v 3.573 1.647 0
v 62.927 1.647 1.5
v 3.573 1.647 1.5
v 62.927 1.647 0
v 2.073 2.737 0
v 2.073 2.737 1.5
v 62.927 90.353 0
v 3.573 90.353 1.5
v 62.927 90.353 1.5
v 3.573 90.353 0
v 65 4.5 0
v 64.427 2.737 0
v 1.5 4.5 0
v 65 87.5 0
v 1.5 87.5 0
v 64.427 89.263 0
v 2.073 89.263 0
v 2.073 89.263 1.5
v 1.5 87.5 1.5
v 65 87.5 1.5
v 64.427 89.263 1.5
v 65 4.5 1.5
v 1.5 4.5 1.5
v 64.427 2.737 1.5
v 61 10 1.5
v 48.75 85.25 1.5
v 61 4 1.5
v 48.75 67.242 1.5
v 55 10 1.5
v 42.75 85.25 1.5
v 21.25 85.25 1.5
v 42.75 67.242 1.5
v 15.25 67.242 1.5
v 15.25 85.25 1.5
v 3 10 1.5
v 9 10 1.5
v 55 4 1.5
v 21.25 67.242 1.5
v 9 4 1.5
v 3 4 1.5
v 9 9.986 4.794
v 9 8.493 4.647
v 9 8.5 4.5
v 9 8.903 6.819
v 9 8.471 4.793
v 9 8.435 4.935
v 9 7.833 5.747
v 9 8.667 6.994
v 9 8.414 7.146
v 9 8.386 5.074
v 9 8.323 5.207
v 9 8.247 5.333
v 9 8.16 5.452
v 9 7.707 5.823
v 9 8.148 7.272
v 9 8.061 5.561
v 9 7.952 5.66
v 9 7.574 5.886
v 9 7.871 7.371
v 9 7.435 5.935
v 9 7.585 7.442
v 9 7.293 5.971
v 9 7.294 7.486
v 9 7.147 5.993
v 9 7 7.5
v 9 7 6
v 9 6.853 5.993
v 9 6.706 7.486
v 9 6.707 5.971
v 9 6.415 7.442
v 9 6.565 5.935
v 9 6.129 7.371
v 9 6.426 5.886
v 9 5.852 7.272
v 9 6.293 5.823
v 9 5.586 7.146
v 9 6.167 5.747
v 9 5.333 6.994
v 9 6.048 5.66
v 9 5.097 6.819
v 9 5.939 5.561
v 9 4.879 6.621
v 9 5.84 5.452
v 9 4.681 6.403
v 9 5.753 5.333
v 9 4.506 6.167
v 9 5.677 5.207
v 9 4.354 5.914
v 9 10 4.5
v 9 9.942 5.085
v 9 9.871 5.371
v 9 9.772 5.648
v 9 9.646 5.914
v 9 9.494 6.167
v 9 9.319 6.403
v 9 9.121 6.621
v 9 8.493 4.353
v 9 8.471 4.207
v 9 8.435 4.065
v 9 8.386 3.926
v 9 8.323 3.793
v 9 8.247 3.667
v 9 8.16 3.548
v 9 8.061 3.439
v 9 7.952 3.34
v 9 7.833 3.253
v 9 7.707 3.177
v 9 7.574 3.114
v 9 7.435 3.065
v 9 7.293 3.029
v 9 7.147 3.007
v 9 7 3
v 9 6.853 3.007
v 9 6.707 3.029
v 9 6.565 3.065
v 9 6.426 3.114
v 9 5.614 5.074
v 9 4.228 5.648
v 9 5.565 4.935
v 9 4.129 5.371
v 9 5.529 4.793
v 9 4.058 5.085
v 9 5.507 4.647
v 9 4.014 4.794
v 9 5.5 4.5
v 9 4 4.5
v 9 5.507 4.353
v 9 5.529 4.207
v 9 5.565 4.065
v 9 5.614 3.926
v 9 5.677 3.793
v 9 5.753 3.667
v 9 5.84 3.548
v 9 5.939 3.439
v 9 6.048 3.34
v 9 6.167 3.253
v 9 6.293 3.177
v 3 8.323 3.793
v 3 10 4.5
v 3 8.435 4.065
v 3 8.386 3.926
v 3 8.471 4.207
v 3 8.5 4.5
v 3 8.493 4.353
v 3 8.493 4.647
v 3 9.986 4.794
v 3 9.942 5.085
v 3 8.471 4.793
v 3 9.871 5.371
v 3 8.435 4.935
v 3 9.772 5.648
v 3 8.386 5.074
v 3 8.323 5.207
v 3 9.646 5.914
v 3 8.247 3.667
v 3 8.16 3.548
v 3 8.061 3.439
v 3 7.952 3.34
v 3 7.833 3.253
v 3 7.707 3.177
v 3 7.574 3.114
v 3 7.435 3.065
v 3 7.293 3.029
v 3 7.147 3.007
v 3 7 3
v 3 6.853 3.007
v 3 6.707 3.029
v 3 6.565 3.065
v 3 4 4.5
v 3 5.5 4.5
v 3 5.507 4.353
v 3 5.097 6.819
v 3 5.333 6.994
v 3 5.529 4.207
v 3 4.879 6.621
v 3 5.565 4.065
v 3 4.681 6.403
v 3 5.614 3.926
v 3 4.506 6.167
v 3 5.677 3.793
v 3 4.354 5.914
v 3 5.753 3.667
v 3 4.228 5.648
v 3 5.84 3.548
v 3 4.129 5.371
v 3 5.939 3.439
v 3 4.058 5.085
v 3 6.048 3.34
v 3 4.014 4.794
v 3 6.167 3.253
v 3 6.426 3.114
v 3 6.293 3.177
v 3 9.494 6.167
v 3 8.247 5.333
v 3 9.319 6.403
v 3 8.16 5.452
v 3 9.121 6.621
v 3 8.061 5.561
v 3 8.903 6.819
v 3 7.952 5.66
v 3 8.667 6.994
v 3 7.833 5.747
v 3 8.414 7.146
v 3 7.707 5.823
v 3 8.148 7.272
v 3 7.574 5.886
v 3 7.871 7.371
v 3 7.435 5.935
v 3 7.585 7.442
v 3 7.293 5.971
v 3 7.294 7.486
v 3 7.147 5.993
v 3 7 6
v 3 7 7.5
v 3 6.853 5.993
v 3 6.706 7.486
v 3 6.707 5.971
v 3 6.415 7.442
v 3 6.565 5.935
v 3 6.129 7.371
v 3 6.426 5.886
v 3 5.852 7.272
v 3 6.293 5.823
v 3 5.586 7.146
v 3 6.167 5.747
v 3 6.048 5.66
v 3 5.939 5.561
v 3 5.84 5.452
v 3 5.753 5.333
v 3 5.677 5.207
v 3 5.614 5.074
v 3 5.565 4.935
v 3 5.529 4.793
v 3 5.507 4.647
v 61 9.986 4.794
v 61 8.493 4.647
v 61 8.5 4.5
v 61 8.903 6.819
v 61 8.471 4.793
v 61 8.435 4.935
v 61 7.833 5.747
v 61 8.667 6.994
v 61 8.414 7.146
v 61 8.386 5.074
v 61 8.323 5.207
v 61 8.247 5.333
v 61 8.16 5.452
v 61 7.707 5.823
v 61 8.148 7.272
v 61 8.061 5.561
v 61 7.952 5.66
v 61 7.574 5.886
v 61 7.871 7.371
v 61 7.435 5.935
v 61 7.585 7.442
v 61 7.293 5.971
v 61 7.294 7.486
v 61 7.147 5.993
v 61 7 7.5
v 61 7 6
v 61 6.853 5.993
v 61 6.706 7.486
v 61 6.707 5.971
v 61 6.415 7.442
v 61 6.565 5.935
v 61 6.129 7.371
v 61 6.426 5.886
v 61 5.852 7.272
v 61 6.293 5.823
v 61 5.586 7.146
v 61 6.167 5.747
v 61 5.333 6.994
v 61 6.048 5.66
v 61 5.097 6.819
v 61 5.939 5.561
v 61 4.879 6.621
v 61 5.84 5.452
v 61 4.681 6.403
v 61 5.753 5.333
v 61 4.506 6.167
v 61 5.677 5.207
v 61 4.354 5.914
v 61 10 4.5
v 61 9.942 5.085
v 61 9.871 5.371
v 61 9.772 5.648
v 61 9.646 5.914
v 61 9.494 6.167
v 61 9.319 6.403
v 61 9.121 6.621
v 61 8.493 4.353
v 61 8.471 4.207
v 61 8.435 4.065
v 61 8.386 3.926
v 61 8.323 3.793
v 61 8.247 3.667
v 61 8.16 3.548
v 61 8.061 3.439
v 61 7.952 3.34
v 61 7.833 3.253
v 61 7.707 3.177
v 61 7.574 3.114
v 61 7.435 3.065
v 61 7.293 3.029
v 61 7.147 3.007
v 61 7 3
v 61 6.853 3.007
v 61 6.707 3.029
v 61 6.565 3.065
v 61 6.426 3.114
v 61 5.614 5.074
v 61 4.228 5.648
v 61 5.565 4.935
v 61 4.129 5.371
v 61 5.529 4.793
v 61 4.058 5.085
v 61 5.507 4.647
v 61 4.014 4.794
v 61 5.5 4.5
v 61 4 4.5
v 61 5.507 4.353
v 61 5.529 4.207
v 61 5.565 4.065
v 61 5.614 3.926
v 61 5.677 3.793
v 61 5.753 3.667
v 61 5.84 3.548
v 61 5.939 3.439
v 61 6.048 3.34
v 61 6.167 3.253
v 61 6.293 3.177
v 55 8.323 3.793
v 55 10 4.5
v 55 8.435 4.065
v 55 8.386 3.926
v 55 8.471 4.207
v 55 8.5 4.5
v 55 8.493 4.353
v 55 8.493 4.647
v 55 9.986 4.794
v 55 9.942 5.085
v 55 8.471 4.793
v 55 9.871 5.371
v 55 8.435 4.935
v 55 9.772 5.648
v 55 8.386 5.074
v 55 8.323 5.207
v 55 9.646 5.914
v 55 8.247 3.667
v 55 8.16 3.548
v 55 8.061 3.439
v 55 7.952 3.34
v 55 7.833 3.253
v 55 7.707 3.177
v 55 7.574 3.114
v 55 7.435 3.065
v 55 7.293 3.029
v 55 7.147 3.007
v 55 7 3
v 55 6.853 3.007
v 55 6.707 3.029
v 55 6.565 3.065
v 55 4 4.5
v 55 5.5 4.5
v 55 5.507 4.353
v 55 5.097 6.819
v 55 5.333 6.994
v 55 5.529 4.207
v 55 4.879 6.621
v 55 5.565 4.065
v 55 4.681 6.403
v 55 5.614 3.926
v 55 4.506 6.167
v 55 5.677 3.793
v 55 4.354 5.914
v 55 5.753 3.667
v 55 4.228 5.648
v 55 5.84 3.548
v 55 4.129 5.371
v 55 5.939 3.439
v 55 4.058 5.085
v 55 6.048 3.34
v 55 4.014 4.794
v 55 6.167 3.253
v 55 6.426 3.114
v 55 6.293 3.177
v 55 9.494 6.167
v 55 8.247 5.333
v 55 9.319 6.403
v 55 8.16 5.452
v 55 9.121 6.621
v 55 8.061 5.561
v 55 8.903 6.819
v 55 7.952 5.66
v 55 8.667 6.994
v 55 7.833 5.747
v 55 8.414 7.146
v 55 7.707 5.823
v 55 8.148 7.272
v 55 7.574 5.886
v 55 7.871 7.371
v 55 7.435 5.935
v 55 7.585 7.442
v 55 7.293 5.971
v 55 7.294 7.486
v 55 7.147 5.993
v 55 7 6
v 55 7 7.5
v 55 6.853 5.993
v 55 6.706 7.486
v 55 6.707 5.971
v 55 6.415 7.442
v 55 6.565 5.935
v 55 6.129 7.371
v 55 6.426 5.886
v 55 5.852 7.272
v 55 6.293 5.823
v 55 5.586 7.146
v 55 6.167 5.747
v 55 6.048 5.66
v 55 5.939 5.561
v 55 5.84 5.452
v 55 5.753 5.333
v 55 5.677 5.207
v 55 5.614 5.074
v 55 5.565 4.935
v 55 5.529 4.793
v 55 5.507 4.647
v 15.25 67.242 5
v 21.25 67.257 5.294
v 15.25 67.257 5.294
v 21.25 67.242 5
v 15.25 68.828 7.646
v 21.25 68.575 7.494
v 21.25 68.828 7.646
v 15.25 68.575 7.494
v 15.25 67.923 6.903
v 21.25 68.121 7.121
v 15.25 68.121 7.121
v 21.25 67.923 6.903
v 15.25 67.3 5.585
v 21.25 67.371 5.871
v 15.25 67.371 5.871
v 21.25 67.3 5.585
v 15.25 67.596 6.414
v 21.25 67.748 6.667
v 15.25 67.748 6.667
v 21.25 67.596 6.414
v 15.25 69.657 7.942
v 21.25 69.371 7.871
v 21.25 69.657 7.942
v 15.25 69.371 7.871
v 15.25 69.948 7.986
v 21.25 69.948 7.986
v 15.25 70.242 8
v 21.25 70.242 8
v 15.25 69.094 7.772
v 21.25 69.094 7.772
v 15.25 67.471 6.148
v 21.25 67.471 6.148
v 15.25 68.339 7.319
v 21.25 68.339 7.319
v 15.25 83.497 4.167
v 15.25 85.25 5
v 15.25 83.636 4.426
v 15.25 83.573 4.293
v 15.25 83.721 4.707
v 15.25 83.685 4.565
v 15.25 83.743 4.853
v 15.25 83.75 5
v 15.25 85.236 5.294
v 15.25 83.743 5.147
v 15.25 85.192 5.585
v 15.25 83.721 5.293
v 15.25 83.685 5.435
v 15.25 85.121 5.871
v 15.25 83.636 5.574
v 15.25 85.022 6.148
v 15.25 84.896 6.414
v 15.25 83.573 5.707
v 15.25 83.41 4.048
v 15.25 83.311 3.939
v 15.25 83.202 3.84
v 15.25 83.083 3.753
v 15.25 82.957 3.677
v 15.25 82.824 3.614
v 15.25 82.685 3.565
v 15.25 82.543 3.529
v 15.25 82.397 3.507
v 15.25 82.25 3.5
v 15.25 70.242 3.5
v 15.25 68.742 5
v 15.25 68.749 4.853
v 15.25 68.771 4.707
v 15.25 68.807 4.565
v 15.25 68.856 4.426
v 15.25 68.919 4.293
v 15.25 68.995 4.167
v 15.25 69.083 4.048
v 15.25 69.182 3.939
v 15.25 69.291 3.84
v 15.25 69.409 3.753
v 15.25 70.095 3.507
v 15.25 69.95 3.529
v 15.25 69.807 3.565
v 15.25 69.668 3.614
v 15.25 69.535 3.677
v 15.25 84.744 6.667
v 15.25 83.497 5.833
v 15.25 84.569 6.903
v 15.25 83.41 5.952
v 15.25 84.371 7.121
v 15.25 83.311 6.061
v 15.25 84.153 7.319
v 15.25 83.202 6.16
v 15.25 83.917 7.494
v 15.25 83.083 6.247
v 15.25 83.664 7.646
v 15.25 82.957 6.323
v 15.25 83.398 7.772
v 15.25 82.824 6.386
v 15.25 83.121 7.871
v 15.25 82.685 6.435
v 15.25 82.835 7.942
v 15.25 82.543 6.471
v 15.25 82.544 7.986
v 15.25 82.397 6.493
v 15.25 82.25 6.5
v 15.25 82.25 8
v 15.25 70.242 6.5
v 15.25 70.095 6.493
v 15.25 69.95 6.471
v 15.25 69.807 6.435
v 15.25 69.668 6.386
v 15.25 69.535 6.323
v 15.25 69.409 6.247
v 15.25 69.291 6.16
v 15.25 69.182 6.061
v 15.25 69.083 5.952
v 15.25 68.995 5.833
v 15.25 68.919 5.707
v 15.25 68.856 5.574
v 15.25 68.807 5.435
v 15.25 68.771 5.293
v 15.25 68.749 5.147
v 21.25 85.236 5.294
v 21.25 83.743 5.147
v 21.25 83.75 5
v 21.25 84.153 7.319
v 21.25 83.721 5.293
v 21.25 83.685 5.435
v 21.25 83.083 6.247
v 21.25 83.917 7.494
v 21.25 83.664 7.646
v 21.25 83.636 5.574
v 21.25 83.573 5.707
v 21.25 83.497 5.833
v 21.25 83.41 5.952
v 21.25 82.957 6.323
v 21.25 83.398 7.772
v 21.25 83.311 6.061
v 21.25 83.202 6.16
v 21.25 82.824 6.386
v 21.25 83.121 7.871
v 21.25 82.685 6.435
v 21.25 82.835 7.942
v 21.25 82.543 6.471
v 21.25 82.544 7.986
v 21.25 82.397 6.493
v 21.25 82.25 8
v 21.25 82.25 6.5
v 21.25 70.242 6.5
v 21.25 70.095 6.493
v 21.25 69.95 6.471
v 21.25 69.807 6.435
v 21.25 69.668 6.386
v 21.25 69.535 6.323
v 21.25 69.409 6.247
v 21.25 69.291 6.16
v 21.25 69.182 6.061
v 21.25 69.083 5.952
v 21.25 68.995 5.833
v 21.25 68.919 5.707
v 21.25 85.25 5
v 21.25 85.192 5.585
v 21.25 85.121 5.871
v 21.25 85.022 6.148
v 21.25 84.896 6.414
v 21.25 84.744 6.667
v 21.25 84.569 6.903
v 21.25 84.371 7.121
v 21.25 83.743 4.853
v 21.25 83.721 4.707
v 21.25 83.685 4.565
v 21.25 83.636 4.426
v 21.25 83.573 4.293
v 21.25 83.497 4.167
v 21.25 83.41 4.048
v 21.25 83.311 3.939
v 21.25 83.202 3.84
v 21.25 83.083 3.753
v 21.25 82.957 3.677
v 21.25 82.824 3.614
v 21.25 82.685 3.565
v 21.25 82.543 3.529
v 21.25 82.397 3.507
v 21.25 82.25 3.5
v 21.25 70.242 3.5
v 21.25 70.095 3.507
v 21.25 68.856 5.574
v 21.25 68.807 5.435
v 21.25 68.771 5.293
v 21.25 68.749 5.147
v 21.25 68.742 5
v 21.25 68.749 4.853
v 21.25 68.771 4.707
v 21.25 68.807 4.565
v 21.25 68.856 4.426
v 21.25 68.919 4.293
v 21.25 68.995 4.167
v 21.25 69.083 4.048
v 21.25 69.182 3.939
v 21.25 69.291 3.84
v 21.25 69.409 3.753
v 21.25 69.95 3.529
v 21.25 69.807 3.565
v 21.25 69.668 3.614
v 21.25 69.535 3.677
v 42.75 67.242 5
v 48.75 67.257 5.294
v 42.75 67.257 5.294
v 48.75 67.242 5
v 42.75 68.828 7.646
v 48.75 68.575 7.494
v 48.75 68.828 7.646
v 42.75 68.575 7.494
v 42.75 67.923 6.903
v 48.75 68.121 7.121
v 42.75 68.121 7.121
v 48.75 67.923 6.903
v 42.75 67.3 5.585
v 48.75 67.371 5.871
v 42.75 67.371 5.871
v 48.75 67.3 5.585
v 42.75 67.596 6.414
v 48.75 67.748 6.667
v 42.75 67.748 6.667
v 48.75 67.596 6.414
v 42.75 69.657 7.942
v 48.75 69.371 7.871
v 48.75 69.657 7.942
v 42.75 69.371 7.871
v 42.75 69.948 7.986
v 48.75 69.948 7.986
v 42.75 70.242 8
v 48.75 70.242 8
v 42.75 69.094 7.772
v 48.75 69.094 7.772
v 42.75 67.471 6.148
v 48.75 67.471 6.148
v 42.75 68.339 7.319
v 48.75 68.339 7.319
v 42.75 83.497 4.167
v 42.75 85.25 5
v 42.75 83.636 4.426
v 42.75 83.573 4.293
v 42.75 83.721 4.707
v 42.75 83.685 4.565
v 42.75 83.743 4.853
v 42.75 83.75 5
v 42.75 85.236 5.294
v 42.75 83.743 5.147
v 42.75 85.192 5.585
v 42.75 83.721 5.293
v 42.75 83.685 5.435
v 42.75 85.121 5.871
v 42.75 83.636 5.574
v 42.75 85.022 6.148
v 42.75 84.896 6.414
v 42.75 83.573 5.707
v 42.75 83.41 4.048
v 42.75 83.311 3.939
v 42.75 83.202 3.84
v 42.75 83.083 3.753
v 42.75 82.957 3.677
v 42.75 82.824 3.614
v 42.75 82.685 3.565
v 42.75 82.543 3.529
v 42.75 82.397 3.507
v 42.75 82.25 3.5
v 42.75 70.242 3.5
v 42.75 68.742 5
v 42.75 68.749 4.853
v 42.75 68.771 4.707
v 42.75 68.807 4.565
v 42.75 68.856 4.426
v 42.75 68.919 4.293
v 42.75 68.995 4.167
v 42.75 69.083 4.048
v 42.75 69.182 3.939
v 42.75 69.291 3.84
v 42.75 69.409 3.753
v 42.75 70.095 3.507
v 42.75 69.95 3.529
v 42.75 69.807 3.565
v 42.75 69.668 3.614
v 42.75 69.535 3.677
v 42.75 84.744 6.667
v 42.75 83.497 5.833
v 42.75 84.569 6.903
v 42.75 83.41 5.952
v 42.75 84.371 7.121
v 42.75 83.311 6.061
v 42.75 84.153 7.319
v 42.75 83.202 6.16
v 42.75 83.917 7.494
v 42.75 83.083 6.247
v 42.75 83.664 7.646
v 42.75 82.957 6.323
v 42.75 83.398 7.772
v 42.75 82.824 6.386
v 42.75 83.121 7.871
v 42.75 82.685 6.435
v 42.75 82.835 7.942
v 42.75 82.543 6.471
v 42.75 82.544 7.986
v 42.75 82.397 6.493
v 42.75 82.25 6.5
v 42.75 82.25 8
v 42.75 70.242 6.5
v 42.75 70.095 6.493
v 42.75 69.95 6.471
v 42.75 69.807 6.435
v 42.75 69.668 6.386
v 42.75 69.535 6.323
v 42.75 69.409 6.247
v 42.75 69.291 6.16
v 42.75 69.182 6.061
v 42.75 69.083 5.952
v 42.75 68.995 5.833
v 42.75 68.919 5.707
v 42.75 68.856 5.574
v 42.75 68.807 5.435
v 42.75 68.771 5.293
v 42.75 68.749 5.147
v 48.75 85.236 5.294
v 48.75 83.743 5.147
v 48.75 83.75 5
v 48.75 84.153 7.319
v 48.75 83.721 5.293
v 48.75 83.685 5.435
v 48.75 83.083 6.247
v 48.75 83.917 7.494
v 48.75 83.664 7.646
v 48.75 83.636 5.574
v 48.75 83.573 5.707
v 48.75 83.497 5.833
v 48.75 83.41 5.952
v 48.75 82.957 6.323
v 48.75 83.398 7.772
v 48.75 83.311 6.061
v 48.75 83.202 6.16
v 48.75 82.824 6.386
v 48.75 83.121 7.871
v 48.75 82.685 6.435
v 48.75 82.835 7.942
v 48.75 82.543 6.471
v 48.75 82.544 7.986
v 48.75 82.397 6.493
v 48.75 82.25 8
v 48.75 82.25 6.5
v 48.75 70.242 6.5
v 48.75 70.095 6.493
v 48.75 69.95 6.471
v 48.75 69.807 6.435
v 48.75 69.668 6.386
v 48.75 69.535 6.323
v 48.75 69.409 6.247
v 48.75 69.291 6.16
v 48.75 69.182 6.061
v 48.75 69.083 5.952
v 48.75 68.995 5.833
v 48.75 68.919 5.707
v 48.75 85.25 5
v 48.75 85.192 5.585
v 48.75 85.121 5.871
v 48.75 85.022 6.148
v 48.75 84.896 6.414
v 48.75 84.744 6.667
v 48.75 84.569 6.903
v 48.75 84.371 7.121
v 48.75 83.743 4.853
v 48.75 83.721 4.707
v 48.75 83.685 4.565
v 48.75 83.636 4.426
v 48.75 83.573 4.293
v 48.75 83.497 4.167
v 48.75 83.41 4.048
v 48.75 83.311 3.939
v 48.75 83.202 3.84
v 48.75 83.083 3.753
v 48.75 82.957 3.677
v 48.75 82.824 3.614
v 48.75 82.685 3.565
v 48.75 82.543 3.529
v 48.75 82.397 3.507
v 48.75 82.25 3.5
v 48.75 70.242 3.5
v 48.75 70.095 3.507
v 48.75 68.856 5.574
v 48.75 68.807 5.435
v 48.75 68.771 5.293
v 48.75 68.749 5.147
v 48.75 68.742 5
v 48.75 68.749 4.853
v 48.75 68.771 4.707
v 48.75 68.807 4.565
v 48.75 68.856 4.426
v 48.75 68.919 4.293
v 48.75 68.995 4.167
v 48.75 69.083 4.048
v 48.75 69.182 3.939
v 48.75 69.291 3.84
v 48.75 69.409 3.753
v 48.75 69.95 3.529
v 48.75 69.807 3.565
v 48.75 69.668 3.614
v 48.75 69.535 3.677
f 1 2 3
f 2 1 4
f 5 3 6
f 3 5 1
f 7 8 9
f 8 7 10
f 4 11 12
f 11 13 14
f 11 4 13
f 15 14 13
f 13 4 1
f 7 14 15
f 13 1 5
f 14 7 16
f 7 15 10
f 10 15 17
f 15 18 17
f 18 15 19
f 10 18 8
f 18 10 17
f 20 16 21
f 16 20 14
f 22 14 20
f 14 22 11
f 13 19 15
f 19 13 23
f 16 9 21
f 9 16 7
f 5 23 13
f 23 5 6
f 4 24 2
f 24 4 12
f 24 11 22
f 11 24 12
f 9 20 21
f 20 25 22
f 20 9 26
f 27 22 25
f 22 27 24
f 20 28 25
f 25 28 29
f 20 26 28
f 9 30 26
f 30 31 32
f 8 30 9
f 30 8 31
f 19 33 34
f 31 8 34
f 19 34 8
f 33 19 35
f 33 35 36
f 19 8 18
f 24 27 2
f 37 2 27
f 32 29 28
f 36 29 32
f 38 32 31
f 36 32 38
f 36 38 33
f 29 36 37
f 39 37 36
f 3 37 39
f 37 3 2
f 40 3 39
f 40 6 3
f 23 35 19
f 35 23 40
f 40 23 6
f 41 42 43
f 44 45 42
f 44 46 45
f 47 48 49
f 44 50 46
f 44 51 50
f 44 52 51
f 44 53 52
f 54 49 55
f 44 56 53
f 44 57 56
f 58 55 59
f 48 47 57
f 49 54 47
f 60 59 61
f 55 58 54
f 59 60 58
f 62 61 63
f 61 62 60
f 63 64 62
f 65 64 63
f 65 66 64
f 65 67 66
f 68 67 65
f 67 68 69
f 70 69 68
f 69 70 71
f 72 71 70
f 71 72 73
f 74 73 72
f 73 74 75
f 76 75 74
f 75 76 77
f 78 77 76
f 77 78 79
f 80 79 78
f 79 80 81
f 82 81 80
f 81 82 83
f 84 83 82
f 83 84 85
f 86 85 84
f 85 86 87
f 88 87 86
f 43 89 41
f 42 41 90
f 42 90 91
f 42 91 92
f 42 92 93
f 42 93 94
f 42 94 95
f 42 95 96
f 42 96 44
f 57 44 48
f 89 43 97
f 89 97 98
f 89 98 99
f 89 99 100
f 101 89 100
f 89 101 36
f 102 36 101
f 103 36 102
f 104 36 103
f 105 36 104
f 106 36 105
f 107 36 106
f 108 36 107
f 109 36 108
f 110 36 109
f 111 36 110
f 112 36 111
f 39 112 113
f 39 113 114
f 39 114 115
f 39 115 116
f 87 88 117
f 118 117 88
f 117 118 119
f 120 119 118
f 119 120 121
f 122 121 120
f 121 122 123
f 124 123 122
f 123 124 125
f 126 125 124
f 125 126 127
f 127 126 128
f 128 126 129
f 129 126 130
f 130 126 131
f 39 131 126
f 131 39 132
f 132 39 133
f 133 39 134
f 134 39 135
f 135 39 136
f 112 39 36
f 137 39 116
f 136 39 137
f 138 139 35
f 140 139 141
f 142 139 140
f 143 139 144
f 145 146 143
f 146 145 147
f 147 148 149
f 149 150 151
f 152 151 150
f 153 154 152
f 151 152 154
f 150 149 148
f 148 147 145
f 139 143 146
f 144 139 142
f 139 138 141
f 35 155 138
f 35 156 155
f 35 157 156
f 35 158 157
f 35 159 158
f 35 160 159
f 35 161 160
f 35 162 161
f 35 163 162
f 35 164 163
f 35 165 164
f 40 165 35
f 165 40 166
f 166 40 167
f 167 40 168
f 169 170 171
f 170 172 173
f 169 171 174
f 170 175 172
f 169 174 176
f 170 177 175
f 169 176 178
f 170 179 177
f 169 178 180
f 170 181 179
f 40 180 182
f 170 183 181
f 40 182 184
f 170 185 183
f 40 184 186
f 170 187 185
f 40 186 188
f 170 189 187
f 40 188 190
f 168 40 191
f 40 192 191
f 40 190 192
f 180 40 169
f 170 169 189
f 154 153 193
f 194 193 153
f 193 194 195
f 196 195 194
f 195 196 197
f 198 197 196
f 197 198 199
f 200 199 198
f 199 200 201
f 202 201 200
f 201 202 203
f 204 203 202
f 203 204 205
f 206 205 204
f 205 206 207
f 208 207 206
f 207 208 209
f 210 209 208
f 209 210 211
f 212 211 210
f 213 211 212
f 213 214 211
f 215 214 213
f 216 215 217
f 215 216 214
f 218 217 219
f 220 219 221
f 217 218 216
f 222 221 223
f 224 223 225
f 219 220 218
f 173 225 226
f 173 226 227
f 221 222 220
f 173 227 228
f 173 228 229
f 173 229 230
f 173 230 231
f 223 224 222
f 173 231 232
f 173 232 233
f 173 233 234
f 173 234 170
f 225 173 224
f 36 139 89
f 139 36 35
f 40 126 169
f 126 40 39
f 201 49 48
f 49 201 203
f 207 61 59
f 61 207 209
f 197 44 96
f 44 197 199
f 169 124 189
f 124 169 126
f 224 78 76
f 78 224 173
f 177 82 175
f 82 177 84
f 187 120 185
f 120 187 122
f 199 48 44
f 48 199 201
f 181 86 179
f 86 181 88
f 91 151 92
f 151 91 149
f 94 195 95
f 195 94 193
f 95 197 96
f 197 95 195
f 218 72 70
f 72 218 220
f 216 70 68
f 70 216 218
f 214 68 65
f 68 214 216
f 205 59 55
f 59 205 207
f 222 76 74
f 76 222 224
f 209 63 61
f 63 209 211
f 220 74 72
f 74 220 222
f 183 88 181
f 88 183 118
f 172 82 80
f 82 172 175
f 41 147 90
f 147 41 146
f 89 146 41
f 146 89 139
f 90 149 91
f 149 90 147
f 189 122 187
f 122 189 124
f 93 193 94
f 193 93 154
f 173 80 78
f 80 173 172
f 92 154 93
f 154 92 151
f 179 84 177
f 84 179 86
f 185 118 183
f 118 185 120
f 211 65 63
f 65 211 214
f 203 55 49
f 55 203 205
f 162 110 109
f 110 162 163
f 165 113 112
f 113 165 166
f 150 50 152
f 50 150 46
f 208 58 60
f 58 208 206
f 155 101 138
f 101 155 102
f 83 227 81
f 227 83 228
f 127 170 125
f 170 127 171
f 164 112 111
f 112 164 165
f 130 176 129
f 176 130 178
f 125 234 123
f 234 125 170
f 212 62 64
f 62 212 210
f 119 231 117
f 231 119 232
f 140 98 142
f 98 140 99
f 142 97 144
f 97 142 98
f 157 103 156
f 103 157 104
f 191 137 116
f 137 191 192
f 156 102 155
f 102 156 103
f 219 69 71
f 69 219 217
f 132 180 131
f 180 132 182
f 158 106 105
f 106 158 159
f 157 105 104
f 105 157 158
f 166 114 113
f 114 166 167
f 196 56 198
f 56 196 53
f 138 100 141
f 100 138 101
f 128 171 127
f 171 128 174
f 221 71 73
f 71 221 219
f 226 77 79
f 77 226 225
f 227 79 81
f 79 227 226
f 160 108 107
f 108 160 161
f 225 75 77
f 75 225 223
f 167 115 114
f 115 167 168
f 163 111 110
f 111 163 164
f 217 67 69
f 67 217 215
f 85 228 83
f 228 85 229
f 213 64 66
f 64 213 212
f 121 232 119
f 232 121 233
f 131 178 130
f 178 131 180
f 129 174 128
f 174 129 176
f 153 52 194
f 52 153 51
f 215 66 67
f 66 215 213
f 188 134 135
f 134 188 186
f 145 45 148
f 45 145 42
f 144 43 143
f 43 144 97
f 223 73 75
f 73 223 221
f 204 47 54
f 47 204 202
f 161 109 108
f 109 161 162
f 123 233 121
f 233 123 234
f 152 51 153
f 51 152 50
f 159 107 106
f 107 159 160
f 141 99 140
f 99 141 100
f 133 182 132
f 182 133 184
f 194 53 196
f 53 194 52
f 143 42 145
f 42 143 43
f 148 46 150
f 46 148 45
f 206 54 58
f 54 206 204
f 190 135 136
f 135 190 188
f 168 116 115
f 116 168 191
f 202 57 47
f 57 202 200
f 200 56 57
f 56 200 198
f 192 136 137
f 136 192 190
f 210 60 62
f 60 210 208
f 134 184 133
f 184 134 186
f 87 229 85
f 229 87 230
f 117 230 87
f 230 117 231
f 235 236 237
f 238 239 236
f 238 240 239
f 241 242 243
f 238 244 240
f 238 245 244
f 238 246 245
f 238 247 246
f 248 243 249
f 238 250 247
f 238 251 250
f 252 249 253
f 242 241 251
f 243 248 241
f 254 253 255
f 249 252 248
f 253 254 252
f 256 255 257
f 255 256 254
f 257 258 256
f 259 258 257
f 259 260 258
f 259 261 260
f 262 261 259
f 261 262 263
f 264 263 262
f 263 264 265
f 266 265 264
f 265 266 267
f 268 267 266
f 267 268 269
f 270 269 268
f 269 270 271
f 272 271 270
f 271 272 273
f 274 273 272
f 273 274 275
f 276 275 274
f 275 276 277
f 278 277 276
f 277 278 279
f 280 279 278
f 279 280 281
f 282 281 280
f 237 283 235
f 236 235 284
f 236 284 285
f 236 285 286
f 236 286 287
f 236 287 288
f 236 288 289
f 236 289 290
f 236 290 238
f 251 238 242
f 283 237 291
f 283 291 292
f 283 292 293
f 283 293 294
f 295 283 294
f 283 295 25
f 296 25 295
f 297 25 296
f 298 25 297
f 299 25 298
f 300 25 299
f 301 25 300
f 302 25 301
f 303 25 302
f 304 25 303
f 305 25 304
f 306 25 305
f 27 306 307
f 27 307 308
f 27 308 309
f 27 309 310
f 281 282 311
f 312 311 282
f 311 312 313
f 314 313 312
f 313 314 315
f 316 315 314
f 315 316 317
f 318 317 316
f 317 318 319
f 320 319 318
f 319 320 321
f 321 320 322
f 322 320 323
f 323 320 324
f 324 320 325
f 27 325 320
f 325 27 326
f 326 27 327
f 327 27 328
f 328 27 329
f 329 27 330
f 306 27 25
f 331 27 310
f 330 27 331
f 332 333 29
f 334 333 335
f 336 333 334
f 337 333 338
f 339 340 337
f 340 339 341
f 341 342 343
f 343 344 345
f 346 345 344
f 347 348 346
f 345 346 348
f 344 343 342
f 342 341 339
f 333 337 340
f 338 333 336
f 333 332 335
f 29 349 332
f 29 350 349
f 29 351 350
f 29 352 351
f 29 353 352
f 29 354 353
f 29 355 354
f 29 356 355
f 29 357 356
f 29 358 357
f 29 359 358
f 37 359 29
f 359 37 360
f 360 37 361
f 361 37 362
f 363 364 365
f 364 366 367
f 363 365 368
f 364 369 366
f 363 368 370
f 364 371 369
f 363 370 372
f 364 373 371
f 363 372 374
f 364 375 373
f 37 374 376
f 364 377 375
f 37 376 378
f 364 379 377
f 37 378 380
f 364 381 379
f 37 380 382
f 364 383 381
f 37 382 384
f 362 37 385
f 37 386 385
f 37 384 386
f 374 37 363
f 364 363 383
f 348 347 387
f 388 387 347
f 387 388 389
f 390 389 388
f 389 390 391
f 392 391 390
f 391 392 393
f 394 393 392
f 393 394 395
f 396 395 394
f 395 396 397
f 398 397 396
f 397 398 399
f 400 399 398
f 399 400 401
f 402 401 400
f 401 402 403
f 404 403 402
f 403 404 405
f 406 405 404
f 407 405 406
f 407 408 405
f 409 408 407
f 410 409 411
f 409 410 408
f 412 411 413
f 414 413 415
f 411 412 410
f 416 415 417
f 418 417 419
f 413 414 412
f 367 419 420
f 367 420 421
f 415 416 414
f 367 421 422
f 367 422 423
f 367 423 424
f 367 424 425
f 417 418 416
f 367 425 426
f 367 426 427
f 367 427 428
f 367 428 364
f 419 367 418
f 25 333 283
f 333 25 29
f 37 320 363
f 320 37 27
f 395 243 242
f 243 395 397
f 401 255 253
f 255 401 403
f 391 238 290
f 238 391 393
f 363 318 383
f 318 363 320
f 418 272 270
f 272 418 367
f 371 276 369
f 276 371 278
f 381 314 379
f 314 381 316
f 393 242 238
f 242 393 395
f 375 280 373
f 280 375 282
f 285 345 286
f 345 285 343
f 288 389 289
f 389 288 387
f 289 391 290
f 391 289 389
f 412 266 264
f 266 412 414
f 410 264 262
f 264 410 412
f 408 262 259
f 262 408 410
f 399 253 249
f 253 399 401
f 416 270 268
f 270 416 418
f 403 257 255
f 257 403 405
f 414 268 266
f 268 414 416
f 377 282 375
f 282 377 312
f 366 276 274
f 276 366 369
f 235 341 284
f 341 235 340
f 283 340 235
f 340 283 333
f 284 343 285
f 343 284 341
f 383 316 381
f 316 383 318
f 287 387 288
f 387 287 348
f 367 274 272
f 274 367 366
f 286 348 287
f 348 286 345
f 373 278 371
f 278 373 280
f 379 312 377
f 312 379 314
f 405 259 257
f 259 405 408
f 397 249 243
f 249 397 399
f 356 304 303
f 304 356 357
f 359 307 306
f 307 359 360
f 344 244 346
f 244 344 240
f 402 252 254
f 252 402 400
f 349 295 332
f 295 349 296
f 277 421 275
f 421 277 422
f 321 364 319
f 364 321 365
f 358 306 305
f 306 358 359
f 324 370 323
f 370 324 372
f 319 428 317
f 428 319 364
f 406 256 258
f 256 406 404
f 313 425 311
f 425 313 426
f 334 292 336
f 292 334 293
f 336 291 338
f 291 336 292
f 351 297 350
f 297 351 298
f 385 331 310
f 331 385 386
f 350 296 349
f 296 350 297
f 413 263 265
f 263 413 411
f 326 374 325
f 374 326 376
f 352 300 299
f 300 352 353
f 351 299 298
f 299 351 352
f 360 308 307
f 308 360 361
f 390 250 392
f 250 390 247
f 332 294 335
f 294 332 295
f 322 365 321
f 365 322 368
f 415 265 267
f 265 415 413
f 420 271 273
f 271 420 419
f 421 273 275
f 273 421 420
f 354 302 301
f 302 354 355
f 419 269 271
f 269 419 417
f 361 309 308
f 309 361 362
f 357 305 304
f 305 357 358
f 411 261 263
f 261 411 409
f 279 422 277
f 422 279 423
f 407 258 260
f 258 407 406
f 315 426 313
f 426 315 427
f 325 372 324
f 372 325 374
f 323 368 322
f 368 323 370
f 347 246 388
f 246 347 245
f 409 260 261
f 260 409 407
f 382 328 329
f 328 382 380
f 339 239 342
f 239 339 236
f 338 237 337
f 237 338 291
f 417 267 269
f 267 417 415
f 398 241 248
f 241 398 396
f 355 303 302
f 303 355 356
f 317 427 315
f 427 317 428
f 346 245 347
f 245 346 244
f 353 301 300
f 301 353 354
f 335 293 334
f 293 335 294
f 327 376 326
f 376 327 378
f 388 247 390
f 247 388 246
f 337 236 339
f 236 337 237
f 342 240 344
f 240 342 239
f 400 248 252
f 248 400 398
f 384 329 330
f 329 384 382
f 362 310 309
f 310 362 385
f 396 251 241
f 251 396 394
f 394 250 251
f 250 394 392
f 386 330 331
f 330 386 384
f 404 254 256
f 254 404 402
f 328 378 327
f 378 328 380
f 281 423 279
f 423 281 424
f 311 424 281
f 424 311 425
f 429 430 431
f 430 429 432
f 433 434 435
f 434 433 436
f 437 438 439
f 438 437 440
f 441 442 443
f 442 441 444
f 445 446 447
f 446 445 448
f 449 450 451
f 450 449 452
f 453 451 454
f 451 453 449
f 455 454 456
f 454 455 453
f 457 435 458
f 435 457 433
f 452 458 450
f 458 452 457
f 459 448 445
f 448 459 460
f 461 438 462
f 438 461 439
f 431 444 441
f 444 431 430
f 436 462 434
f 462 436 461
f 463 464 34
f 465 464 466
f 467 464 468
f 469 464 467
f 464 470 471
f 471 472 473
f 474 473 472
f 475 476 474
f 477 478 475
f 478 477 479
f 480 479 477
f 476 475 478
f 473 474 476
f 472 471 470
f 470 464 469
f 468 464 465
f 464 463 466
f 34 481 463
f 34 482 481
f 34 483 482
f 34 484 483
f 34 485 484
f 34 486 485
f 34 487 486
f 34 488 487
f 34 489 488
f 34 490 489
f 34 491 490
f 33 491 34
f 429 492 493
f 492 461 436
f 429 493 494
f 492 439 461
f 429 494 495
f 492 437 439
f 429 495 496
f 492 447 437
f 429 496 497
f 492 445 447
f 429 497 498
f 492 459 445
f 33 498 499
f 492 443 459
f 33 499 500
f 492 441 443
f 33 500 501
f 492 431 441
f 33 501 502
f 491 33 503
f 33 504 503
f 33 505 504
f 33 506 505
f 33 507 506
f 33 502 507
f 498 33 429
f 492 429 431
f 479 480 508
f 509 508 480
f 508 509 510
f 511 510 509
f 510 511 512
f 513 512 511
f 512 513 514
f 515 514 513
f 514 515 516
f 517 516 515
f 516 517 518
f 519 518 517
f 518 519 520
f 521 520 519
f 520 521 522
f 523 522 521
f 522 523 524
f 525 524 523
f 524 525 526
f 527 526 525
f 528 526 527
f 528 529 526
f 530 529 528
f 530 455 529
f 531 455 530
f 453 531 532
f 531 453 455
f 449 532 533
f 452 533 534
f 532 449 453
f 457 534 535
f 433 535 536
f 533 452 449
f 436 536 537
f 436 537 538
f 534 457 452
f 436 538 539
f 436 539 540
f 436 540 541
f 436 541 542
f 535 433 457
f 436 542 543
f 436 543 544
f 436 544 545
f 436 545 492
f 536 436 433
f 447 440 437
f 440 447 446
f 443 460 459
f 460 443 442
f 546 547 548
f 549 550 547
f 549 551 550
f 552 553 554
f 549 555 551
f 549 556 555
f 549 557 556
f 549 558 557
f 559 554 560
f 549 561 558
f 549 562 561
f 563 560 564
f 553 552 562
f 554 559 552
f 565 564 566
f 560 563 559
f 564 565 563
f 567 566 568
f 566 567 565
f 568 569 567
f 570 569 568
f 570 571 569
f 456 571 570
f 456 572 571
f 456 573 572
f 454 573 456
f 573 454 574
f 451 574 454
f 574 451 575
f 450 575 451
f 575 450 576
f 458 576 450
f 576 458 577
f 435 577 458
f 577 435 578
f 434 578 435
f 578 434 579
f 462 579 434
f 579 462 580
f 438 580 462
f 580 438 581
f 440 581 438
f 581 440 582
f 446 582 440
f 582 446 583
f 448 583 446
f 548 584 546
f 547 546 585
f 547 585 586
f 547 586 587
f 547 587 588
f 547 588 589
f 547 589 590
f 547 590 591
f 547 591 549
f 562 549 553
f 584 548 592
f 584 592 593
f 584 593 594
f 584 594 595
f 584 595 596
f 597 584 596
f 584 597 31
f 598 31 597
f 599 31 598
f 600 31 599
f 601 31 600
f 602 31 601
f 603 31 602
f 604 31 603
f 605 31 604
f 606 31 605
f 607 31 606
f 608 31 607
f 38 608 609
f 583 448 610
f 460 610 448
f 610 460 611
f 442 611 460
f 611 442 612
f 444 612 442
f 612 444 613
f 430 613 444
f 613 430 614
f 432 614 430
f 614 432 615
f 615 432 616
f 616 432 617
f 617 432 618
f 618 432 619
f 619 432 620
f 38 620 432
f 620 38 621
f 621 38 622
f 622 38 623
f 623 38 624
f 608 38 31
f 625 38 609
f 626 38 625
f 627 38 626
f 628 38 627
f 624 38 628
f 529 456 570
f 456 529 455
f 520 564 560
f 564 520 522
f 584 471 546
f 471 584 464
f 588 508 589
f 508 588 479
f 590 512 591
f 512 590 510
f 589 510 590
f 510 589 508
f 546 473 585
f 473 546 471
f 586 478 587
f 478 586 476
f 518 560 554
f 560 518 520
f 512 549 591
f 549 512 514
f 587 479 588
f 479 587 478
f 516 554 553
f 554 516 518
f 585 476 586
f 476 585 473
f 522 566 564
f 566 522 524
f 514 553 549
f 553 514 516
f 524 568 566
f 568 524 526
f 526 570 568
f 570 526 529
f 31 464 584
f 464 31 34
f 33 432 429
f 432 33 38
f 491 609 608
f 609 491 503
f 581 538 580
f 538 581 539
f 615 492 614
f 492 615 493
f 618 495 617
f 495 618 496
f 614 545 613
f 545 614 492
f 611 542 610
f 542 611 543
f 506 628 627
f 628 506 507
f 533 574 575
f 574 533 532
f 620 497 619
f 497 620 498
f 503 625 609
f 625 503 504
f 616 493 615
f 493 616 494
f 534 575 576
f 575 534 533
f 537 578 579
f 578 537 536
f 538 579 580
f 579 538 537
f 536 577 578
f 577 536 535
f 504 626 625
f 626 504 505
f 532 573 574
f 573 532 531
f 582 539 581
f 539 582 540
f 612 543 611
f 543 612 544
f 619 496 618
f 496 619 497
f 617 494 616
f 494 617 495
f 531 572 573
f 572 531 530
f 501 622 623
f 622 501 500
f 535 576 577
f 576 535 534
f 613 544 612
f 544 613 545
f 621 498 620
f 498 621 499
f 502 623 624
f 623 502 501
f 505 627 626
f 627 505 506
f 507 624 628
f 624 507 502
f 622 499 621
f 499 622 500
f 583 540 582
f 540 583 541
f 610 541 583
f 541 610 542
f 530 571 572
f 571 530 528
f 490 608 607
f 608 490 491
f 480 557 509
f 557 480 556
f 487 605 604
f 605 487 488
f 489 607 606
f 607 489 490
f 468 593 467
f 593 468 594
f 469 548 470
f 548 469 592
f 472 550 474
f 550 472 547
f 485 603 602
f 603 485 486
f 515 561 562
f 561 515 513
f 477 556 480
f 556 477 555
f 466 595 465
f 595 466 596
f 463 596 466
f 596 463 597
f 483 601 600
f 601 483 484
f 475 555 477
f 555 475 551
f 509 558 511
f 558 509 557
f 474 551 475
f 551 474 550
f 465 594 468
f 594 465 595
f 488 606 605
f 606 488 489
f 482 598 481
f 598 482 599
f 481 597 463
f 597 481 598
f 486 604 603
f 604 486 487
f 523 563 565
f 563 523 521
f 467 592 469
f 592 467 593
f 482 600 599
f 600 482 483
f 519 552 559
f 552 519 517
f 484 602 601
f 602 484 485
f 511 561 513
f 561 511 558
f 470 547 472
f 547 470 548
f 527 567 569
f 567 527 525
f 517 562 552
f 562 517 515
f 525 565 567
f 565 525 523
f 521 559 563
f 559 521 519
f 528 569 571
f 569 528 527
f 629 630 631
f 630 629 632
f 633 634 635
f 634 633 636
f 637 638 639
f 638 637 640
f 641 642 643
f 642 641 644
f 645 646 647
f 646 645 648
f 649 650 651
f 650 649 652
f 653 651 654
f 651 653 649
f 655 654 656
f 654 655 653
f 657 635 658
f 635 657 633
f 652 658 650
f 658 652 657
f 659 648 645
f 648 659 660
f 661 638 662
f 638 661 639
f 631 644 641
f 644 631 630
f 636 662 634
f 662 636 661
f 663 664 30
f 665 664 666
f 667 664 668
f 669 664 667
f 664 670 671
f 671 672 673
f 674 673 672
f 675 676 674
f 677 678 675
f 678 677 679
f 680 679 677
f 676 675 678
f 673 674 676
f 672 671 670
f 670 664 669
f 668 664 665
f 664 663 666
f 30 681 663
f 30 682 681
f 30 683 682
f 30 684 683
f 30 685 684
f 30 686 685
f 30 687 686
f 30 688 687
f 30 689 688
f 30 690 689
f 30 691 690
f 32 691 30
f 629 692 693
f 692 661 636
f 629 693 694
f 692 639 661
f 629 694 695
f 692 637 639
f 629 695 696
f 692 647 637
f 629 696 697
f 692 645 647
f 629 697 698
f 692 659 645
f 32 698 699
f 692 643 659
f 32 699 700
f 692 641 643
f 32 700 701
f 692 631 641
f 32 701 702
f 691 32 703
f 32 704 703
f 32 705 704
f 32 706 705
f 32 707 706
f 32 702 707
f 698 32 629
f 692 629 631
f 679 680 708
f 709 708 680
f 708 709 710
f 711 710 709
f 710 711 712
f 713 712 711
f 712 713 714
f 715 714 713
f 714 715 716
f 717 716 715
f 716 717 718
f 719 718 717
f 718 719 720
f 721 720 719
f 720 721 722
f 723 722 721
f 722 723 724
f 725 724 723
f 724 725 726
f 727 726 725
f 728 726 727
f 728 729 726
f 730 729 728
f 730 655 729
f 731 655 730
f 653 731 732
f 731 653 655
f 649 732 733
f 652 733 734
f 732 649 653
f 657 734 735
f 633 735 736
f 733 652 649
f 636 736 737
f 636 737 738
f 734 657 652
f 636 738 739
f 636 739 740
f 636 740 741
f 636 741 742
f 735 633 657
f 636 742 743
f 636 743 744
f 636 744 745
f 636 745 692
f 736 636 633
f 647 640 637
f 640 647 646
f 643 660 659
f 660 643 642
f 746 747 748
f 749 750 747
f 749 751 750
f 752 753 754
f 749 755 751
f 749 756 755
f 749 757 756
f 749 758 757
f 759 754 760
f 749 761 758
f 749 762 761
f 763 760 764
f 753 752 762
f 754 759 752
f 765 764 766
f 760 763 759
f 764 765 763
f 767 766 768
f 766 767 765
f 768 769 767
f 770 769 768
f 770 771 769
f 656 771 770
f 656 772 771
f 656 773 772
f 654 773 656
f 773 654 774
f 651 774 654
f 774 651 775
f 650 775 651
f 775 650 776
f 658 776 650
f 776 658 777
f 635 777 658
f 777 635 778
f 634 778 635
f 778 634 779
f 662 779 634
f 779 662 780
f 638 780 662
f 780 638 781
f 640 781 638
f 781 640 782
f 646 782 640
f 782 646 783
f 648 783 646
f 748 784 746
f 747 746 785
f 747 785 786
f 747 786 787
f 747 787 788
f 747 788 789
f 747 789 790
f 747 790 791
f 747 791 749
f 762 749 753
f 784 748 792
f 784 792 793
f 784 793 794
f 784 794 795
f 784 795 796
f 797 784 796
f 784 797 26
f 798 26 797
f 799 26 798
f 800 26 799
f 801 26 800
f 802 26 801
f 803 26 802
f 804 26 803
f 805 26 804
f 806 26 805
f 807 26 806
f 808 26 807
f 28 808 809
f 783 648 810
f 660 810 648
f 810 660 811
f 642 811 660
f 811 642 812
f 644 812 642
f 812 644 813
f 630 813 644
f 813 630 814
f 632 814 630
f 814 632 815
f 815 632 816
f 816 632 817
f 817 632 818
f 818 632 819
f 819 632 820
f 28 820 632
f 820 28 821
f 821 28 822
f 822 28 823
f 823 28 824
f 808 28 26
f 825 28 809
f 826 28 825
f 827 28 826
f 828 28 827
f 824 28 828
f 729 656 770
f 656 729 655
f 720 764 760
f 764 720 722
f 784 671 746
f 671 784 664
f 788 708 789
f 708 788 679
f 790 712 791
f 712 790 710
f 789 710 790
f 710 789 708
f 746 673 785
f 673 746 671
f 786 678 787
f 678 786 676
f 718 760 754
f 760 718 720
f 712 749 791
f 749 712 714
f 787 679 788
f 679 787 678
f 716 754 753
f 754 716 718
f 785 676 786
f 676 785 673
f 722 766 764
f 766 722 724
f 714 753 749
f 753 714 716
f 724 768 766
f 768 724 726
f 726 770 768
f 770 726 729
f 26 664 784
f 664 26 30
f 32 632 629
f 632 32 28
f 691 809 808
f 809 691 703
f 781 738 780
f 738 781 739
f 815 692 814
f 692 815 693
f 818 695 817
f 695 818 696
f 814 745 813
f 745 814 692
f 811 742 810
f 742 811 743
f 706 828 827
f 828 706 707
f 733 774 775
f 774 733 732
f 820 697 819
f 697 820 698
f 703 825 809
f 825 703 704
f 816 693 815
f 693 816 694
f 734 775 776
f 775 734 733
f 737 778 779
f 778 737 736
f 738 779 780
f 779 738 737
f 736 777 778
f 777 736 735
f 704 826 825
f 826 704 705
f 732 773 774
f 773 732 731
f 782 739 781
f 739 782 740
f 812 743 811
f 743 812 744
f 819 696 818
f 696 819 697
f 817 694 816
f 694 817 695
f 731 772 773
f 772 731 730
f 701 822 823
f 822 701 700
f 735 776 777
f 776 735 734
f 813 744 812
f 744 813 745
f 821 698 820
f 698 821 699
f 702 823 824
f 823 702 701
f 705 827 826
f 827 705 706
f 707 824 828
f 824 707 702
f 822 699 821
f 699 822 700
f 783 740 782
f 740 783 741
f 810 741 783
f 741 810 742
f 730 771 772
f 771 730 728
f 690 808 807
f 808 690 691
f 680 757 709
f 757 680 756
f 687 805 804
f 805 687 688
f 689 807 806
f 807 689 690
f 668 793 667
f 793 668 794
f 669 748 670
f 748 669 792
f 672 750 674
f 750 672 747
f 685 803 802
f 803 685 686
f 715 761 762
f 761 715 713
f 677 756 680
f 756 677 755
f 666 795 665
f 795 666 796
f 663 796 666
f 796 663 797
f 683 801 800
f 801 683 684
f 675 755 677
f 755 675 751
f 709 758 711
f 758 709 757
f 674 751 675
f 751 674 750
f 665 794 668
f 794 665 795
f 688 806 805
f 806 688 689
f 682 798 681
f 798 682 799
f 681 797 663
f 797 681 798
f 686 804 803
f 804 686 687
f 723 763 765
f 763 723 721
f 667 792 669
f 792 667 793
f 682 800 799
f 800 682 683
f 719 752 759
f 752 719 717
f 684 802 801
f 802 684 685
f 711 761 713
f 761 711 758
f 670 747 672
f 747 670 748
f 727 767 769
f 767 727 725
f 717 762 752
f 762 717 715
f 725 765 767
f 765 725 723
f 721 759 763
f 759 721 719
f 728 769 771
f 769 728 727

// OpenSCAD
// file: ../modules/mRoundedCorners.scad
module roundedcube(size = [1, 1, 1], center = false, radius = 0.5, apply_to = "all") {
	// If single value, convert to [x, y, z] vector
	size = (size[0] == undef) ? [size, size, size] : size;

	translate_min = radius;
	translate_xmax = size[0] - radius;
	translate_ymax = size[1] - radius;
	translate_zmax = size[2] - radius;

	diameter = radius * 2;

	obj_translate = (center == false) ?
		[0, 0, 0] : [
			-(size[0] / 2),
			-(size[1] / 2),
			-(size[2] / 2)
		];

	translate(v = obj_translate) {
		hull() {
			for (translate_x = [translate_min, translate_xmax]) {
				x_at = (translate_x == translate_min) ? "min" : "max";
				for (translate_y = [translate_min, translate_ymax]) {
					y_at = (translate_y == translate_min) ? "min" : "max";
					for (translate_z = [translate_min, translate_zmax]) {
						z_at = (translate_z == translate_min) ? "min" : "max";

						translate(v = [translate_x, translate_y, translate_z])
						if (
							(apply_to == "all") ||
							(apply_to == "xmin" && x_at == "min") || (apply_to == "xmax" && x_at == "max") ||
							(apply_to == "ymin" && y_at == "min") || (apply_to == "ymax" && y_at == "max") ||
							(apply_to == "zmin" && z_at == "min") || (apply_to == "zmax" && z_at == "max")
						) {
							sphere(r = radius);
						} else {
							rotate = 
								(apply_to == "xmin" || apply_to == "xmax" || apply_to == "x") ? [0, 90, 0] : (
								(apply_to == "ymin" || apply_to == "ymax" || apply_to == "y") ? [90, 90, 0] :
								[0, 0, 0]
							);
							rotate(a = rotate)
							cylinder(h = diameter, r = radius, center = true);
						}
					}
				}
			}
		}
	}
}
// file: ../modules/mUtilityFunction.scad
// Utility function to look up a value by key in a list of key-value pairs (dictionary).
// Returns undef if the key is not found.
// Example usage:
// my_dict = [ ["sam", 1], ["bill", 2], ["charley", 3] ];
// value = dict_lookup("bill", my_dict); // value will be 2
function dict_lookup(key, table) = 
    let ( found_item = [for (item = table) if (item[0] == key) item[1] ] )
        len(found_item) > 0 ? found_item[0] : undef;


module screw_holder(_height,_radius, _radius2 =.5){
    $fn = 32;
    difference(){
        cylinder(_height,r=_radius, true);
        cylinder(_height,r=_radius2,true);
    }
}
// file: ../CardDimensions.scad
// CardDimensions.scad
//holds all the dimensions and parameters for the card box and lift mechanism
//to be included in all parts

$fn=64; //number of facets for circles
//free_space - give a little space around cards and parts to allow for tolerances
free_space = .5;

//playing card dimensions mm
card_width = 63.5;  //2.5"
card_length = 89 ;  //3.5"
card_corner_radius = 3;  //tried 4  
card_thickness = 0.33;
card_deck_height = card_thickness * 52 + free_space*2;

//walls in mm
wall_thickness = 1.5;

//all parts will be made to the same height.  
part_height = 6;
part_thickness = 6;

//the diameter of the pin in the scissor lift mechanism
//this is also the diameter of the holes in the scissor bars
pin_diameter = part_height/2;
pin_hole_diameter = (part_height/2)/cos(180/$fn);

//scissor lift height is twice the part height plus a little extra
//to allow for some movement
scissor_lift_gap = part_height + 2;

//internal and external dimensions of card box 
card_box_inside_width = card_width + free_space;
card_box_inside_length = card_length + free_space;
card_box_inside_height = card_deck_height + scissor_lift_gap + wall_thickness + free_space;
card_box_outside_width = card_box_inside_width + 2 * wall_thickness;
card_box_outside_length = card_box_inside_length + 2 * wall_thickness;
card_box_outside_height = card_box_inside_height + wall_thickness;
card_box_corner_radius = card_corner_radius + wall_thickness;


//outside dimmesions of the box outside that holds the card box and lift mechanism
box_outside_width = card_box_outside_width + 2 * wall_thickness;
box_outside_length = card_box_outside_length + 2 * wall_thickness;
box_outside_height = card_box_outside_height + 2 * wall_thickness;
box_corner_radius = card_box_corner_radius + wall_thickness;

//spaces for lift mechanism
side_offset = part_thickness/2;
base_offset = 4;

//calulate the dimensions of the slide holder
//the length of the slide holder is the diffence between the x values of the scissor bar when 
//the scissor is laid flat and when it is fully extended.
//fully extended is then the card support is at the top of the card box.
//first calculate the length of the large scissor bar
large_scissor_bar_length = card_box_inside_length - 2 * base_offset;
//the small scissor bar sits inside the large scissor bar so it is shorter by 2 * part_thickness 
//add the free space to allow for tolerances
small_scissor_bar_length =card_box_inside_length - 2 * base_offset - 2 * part_thickness - free_space;
//then calculate the length of the slide holder
//using pythagorean theorem
//a^2 + b^2 = c^2
//a = card_box_inside_height
//c = large_scissor_bar_length
//b = sqrt(c^2 - a^2)
//slide_length = c - b
large_scissor_bar_slide_length = large_scissor_bar_length - sqrt( pow(large_scissor_bar_length,2) - pow(card_box_inside_height,2) ) + part_height;
small_scissor_bar_slide_length = small_scissor_bar_length - sqrt( pow(small_scissor_bar_length,2) - pow(card_box_inside_height,2) ) + part_height;

echo("large_scissor_bar_slide_length", large_scissor_bar_slide_length, "small_scissor_bar_slide_length", small_scissor_bar_slide_length);

function get_dimensions() = [
    ["card_width", card_width],
    ["card_length", card_length],
    ["card_corner_radius", card_corner_radius],
    ["card_thickness", card_thickness],
    ["card_deck_height", card_deck_height],
    ["wall_thickness", wall_thickness],
    ["part_height", part_height],
    ["part_thickness", part_thickness],
    ["pin_diameter", pin_diameter],
    ["pin_hole_diameter", pin_hole_diameter],
    ["scissor_lift_gap", scissor_lift_gap],
    ["free_space", free_space],
    ["card_box_inside_width", card_box_inside_width],
    ["card_box_inside_length", card_box_inside_length],
    ["card_box_inside_height", card_box_inside_height],
    ["card_box_outside_width", card_box_outside_width],
    ["card_box_outside_length", card_box_outside_length],
    ["card_box_outside_height", card_box_outside_height],
    ["card_box_corner_radius", card_box_corner_radius],
    ["side_offset", side_offset],
    ["base_offset", base_offset],
    ["box_outside_width", box_outside_width],
    ["box_outside_length", box_outside_length],
    ["box_outside_height", box_outside_height],
    ["box_corner_radius", box_corner_radius],
    ["large_scissor_bar_length", large_scissor_bar_length],
    ["small_scissor_bar_length", small_scissor_bar_length],
    ["large_scissor_bar_slide_length", large_scissor_bar_slide_length],
    ["small_scissor_bar_slide_length", small_scissor_bar_slide_length]
];
// main file
// CardDeckSupport.scad
//this part raises the card deck to the top so they can be delt.
use <../CardDimensions.scad>
use <../modules/mUtilityFunction.scad>
use <../modules/mRoundedCorners.scad>
use <../modules/mCardHolderModules.scad>


module CardDeckSupport (dimensions) {
    //get the dimensions values

    wall_thickness = dict_lookup("wall_thickness",dimensions);
    card_width = dict_lookup("card_width",dimensions);
    card_length = dict_lookup("card_length",dimensions);
    card_corner_radius = dict_lookup("card_corner_radius",dimensions);
    side_offset = dict_lookup("side_offset",dimensions);
    base_offset = dict_lookup("base_offset",dimensions);
    card_box_inside_length = dict_lookup("card_box_inside_length",dimensions);
    card_box_inside_width = dict_lookup("card_box_inside_width",dimensions);
    part_thickness = dict_lookup("part_thickness",dimensions);
    part_height = dict_lookup("part_height",dimensions);
    small_scissor_bar_slide_length = dict_lookup("small_scissor_bar_slide_length",dimensions);
    free_space = dict_lookup("free_space",dimensions);
    
    echo("wall_thickness", wall_thickness, "card width", card_width, "card length ", card_length);
    
    //build the deck support
    difference(){
    translate([wall_thickness,wall_thickness,0]) roundedcube([card_width, card_length, 6],false,card_corner_radius,"z");
    translate([wall_thickness,wall_thickness,wall_thickness]) roundedcube([card_width, card_length, 6],false,card_corner_radius,"z");
    }
    // add the lift mechanism holders  
    // the base holders are for the large scissor bar  
    translate([side_offset,base_offset,1])base_holder(dimensions);
    translate([card_box_inside_width - side_offset - part_thickness,base_offset,1])base_holder(dimensions);
    // the slide holders are for the small scissor bar - which fits inside the large scissor bar
    translate([side_offset + 2 * part_thickness + free_space/2,card_box_inside_length - base_offset - part_thickness - small_scissor_bar_slide_length - free_space/2,
        wall_thickness])slide_holder(dimensions, "small");
    translate([card_box_inside_width - side_offset - 3 * part_thickness - free_space/2 ,card_box_inside_length - base_offset - part_thickness - small_scissor_bar_slide_length - free_space/2,
        wall_thickness])slide_holder(dimensions, "small");
}

CardDeckSupport(get_dimensions());
